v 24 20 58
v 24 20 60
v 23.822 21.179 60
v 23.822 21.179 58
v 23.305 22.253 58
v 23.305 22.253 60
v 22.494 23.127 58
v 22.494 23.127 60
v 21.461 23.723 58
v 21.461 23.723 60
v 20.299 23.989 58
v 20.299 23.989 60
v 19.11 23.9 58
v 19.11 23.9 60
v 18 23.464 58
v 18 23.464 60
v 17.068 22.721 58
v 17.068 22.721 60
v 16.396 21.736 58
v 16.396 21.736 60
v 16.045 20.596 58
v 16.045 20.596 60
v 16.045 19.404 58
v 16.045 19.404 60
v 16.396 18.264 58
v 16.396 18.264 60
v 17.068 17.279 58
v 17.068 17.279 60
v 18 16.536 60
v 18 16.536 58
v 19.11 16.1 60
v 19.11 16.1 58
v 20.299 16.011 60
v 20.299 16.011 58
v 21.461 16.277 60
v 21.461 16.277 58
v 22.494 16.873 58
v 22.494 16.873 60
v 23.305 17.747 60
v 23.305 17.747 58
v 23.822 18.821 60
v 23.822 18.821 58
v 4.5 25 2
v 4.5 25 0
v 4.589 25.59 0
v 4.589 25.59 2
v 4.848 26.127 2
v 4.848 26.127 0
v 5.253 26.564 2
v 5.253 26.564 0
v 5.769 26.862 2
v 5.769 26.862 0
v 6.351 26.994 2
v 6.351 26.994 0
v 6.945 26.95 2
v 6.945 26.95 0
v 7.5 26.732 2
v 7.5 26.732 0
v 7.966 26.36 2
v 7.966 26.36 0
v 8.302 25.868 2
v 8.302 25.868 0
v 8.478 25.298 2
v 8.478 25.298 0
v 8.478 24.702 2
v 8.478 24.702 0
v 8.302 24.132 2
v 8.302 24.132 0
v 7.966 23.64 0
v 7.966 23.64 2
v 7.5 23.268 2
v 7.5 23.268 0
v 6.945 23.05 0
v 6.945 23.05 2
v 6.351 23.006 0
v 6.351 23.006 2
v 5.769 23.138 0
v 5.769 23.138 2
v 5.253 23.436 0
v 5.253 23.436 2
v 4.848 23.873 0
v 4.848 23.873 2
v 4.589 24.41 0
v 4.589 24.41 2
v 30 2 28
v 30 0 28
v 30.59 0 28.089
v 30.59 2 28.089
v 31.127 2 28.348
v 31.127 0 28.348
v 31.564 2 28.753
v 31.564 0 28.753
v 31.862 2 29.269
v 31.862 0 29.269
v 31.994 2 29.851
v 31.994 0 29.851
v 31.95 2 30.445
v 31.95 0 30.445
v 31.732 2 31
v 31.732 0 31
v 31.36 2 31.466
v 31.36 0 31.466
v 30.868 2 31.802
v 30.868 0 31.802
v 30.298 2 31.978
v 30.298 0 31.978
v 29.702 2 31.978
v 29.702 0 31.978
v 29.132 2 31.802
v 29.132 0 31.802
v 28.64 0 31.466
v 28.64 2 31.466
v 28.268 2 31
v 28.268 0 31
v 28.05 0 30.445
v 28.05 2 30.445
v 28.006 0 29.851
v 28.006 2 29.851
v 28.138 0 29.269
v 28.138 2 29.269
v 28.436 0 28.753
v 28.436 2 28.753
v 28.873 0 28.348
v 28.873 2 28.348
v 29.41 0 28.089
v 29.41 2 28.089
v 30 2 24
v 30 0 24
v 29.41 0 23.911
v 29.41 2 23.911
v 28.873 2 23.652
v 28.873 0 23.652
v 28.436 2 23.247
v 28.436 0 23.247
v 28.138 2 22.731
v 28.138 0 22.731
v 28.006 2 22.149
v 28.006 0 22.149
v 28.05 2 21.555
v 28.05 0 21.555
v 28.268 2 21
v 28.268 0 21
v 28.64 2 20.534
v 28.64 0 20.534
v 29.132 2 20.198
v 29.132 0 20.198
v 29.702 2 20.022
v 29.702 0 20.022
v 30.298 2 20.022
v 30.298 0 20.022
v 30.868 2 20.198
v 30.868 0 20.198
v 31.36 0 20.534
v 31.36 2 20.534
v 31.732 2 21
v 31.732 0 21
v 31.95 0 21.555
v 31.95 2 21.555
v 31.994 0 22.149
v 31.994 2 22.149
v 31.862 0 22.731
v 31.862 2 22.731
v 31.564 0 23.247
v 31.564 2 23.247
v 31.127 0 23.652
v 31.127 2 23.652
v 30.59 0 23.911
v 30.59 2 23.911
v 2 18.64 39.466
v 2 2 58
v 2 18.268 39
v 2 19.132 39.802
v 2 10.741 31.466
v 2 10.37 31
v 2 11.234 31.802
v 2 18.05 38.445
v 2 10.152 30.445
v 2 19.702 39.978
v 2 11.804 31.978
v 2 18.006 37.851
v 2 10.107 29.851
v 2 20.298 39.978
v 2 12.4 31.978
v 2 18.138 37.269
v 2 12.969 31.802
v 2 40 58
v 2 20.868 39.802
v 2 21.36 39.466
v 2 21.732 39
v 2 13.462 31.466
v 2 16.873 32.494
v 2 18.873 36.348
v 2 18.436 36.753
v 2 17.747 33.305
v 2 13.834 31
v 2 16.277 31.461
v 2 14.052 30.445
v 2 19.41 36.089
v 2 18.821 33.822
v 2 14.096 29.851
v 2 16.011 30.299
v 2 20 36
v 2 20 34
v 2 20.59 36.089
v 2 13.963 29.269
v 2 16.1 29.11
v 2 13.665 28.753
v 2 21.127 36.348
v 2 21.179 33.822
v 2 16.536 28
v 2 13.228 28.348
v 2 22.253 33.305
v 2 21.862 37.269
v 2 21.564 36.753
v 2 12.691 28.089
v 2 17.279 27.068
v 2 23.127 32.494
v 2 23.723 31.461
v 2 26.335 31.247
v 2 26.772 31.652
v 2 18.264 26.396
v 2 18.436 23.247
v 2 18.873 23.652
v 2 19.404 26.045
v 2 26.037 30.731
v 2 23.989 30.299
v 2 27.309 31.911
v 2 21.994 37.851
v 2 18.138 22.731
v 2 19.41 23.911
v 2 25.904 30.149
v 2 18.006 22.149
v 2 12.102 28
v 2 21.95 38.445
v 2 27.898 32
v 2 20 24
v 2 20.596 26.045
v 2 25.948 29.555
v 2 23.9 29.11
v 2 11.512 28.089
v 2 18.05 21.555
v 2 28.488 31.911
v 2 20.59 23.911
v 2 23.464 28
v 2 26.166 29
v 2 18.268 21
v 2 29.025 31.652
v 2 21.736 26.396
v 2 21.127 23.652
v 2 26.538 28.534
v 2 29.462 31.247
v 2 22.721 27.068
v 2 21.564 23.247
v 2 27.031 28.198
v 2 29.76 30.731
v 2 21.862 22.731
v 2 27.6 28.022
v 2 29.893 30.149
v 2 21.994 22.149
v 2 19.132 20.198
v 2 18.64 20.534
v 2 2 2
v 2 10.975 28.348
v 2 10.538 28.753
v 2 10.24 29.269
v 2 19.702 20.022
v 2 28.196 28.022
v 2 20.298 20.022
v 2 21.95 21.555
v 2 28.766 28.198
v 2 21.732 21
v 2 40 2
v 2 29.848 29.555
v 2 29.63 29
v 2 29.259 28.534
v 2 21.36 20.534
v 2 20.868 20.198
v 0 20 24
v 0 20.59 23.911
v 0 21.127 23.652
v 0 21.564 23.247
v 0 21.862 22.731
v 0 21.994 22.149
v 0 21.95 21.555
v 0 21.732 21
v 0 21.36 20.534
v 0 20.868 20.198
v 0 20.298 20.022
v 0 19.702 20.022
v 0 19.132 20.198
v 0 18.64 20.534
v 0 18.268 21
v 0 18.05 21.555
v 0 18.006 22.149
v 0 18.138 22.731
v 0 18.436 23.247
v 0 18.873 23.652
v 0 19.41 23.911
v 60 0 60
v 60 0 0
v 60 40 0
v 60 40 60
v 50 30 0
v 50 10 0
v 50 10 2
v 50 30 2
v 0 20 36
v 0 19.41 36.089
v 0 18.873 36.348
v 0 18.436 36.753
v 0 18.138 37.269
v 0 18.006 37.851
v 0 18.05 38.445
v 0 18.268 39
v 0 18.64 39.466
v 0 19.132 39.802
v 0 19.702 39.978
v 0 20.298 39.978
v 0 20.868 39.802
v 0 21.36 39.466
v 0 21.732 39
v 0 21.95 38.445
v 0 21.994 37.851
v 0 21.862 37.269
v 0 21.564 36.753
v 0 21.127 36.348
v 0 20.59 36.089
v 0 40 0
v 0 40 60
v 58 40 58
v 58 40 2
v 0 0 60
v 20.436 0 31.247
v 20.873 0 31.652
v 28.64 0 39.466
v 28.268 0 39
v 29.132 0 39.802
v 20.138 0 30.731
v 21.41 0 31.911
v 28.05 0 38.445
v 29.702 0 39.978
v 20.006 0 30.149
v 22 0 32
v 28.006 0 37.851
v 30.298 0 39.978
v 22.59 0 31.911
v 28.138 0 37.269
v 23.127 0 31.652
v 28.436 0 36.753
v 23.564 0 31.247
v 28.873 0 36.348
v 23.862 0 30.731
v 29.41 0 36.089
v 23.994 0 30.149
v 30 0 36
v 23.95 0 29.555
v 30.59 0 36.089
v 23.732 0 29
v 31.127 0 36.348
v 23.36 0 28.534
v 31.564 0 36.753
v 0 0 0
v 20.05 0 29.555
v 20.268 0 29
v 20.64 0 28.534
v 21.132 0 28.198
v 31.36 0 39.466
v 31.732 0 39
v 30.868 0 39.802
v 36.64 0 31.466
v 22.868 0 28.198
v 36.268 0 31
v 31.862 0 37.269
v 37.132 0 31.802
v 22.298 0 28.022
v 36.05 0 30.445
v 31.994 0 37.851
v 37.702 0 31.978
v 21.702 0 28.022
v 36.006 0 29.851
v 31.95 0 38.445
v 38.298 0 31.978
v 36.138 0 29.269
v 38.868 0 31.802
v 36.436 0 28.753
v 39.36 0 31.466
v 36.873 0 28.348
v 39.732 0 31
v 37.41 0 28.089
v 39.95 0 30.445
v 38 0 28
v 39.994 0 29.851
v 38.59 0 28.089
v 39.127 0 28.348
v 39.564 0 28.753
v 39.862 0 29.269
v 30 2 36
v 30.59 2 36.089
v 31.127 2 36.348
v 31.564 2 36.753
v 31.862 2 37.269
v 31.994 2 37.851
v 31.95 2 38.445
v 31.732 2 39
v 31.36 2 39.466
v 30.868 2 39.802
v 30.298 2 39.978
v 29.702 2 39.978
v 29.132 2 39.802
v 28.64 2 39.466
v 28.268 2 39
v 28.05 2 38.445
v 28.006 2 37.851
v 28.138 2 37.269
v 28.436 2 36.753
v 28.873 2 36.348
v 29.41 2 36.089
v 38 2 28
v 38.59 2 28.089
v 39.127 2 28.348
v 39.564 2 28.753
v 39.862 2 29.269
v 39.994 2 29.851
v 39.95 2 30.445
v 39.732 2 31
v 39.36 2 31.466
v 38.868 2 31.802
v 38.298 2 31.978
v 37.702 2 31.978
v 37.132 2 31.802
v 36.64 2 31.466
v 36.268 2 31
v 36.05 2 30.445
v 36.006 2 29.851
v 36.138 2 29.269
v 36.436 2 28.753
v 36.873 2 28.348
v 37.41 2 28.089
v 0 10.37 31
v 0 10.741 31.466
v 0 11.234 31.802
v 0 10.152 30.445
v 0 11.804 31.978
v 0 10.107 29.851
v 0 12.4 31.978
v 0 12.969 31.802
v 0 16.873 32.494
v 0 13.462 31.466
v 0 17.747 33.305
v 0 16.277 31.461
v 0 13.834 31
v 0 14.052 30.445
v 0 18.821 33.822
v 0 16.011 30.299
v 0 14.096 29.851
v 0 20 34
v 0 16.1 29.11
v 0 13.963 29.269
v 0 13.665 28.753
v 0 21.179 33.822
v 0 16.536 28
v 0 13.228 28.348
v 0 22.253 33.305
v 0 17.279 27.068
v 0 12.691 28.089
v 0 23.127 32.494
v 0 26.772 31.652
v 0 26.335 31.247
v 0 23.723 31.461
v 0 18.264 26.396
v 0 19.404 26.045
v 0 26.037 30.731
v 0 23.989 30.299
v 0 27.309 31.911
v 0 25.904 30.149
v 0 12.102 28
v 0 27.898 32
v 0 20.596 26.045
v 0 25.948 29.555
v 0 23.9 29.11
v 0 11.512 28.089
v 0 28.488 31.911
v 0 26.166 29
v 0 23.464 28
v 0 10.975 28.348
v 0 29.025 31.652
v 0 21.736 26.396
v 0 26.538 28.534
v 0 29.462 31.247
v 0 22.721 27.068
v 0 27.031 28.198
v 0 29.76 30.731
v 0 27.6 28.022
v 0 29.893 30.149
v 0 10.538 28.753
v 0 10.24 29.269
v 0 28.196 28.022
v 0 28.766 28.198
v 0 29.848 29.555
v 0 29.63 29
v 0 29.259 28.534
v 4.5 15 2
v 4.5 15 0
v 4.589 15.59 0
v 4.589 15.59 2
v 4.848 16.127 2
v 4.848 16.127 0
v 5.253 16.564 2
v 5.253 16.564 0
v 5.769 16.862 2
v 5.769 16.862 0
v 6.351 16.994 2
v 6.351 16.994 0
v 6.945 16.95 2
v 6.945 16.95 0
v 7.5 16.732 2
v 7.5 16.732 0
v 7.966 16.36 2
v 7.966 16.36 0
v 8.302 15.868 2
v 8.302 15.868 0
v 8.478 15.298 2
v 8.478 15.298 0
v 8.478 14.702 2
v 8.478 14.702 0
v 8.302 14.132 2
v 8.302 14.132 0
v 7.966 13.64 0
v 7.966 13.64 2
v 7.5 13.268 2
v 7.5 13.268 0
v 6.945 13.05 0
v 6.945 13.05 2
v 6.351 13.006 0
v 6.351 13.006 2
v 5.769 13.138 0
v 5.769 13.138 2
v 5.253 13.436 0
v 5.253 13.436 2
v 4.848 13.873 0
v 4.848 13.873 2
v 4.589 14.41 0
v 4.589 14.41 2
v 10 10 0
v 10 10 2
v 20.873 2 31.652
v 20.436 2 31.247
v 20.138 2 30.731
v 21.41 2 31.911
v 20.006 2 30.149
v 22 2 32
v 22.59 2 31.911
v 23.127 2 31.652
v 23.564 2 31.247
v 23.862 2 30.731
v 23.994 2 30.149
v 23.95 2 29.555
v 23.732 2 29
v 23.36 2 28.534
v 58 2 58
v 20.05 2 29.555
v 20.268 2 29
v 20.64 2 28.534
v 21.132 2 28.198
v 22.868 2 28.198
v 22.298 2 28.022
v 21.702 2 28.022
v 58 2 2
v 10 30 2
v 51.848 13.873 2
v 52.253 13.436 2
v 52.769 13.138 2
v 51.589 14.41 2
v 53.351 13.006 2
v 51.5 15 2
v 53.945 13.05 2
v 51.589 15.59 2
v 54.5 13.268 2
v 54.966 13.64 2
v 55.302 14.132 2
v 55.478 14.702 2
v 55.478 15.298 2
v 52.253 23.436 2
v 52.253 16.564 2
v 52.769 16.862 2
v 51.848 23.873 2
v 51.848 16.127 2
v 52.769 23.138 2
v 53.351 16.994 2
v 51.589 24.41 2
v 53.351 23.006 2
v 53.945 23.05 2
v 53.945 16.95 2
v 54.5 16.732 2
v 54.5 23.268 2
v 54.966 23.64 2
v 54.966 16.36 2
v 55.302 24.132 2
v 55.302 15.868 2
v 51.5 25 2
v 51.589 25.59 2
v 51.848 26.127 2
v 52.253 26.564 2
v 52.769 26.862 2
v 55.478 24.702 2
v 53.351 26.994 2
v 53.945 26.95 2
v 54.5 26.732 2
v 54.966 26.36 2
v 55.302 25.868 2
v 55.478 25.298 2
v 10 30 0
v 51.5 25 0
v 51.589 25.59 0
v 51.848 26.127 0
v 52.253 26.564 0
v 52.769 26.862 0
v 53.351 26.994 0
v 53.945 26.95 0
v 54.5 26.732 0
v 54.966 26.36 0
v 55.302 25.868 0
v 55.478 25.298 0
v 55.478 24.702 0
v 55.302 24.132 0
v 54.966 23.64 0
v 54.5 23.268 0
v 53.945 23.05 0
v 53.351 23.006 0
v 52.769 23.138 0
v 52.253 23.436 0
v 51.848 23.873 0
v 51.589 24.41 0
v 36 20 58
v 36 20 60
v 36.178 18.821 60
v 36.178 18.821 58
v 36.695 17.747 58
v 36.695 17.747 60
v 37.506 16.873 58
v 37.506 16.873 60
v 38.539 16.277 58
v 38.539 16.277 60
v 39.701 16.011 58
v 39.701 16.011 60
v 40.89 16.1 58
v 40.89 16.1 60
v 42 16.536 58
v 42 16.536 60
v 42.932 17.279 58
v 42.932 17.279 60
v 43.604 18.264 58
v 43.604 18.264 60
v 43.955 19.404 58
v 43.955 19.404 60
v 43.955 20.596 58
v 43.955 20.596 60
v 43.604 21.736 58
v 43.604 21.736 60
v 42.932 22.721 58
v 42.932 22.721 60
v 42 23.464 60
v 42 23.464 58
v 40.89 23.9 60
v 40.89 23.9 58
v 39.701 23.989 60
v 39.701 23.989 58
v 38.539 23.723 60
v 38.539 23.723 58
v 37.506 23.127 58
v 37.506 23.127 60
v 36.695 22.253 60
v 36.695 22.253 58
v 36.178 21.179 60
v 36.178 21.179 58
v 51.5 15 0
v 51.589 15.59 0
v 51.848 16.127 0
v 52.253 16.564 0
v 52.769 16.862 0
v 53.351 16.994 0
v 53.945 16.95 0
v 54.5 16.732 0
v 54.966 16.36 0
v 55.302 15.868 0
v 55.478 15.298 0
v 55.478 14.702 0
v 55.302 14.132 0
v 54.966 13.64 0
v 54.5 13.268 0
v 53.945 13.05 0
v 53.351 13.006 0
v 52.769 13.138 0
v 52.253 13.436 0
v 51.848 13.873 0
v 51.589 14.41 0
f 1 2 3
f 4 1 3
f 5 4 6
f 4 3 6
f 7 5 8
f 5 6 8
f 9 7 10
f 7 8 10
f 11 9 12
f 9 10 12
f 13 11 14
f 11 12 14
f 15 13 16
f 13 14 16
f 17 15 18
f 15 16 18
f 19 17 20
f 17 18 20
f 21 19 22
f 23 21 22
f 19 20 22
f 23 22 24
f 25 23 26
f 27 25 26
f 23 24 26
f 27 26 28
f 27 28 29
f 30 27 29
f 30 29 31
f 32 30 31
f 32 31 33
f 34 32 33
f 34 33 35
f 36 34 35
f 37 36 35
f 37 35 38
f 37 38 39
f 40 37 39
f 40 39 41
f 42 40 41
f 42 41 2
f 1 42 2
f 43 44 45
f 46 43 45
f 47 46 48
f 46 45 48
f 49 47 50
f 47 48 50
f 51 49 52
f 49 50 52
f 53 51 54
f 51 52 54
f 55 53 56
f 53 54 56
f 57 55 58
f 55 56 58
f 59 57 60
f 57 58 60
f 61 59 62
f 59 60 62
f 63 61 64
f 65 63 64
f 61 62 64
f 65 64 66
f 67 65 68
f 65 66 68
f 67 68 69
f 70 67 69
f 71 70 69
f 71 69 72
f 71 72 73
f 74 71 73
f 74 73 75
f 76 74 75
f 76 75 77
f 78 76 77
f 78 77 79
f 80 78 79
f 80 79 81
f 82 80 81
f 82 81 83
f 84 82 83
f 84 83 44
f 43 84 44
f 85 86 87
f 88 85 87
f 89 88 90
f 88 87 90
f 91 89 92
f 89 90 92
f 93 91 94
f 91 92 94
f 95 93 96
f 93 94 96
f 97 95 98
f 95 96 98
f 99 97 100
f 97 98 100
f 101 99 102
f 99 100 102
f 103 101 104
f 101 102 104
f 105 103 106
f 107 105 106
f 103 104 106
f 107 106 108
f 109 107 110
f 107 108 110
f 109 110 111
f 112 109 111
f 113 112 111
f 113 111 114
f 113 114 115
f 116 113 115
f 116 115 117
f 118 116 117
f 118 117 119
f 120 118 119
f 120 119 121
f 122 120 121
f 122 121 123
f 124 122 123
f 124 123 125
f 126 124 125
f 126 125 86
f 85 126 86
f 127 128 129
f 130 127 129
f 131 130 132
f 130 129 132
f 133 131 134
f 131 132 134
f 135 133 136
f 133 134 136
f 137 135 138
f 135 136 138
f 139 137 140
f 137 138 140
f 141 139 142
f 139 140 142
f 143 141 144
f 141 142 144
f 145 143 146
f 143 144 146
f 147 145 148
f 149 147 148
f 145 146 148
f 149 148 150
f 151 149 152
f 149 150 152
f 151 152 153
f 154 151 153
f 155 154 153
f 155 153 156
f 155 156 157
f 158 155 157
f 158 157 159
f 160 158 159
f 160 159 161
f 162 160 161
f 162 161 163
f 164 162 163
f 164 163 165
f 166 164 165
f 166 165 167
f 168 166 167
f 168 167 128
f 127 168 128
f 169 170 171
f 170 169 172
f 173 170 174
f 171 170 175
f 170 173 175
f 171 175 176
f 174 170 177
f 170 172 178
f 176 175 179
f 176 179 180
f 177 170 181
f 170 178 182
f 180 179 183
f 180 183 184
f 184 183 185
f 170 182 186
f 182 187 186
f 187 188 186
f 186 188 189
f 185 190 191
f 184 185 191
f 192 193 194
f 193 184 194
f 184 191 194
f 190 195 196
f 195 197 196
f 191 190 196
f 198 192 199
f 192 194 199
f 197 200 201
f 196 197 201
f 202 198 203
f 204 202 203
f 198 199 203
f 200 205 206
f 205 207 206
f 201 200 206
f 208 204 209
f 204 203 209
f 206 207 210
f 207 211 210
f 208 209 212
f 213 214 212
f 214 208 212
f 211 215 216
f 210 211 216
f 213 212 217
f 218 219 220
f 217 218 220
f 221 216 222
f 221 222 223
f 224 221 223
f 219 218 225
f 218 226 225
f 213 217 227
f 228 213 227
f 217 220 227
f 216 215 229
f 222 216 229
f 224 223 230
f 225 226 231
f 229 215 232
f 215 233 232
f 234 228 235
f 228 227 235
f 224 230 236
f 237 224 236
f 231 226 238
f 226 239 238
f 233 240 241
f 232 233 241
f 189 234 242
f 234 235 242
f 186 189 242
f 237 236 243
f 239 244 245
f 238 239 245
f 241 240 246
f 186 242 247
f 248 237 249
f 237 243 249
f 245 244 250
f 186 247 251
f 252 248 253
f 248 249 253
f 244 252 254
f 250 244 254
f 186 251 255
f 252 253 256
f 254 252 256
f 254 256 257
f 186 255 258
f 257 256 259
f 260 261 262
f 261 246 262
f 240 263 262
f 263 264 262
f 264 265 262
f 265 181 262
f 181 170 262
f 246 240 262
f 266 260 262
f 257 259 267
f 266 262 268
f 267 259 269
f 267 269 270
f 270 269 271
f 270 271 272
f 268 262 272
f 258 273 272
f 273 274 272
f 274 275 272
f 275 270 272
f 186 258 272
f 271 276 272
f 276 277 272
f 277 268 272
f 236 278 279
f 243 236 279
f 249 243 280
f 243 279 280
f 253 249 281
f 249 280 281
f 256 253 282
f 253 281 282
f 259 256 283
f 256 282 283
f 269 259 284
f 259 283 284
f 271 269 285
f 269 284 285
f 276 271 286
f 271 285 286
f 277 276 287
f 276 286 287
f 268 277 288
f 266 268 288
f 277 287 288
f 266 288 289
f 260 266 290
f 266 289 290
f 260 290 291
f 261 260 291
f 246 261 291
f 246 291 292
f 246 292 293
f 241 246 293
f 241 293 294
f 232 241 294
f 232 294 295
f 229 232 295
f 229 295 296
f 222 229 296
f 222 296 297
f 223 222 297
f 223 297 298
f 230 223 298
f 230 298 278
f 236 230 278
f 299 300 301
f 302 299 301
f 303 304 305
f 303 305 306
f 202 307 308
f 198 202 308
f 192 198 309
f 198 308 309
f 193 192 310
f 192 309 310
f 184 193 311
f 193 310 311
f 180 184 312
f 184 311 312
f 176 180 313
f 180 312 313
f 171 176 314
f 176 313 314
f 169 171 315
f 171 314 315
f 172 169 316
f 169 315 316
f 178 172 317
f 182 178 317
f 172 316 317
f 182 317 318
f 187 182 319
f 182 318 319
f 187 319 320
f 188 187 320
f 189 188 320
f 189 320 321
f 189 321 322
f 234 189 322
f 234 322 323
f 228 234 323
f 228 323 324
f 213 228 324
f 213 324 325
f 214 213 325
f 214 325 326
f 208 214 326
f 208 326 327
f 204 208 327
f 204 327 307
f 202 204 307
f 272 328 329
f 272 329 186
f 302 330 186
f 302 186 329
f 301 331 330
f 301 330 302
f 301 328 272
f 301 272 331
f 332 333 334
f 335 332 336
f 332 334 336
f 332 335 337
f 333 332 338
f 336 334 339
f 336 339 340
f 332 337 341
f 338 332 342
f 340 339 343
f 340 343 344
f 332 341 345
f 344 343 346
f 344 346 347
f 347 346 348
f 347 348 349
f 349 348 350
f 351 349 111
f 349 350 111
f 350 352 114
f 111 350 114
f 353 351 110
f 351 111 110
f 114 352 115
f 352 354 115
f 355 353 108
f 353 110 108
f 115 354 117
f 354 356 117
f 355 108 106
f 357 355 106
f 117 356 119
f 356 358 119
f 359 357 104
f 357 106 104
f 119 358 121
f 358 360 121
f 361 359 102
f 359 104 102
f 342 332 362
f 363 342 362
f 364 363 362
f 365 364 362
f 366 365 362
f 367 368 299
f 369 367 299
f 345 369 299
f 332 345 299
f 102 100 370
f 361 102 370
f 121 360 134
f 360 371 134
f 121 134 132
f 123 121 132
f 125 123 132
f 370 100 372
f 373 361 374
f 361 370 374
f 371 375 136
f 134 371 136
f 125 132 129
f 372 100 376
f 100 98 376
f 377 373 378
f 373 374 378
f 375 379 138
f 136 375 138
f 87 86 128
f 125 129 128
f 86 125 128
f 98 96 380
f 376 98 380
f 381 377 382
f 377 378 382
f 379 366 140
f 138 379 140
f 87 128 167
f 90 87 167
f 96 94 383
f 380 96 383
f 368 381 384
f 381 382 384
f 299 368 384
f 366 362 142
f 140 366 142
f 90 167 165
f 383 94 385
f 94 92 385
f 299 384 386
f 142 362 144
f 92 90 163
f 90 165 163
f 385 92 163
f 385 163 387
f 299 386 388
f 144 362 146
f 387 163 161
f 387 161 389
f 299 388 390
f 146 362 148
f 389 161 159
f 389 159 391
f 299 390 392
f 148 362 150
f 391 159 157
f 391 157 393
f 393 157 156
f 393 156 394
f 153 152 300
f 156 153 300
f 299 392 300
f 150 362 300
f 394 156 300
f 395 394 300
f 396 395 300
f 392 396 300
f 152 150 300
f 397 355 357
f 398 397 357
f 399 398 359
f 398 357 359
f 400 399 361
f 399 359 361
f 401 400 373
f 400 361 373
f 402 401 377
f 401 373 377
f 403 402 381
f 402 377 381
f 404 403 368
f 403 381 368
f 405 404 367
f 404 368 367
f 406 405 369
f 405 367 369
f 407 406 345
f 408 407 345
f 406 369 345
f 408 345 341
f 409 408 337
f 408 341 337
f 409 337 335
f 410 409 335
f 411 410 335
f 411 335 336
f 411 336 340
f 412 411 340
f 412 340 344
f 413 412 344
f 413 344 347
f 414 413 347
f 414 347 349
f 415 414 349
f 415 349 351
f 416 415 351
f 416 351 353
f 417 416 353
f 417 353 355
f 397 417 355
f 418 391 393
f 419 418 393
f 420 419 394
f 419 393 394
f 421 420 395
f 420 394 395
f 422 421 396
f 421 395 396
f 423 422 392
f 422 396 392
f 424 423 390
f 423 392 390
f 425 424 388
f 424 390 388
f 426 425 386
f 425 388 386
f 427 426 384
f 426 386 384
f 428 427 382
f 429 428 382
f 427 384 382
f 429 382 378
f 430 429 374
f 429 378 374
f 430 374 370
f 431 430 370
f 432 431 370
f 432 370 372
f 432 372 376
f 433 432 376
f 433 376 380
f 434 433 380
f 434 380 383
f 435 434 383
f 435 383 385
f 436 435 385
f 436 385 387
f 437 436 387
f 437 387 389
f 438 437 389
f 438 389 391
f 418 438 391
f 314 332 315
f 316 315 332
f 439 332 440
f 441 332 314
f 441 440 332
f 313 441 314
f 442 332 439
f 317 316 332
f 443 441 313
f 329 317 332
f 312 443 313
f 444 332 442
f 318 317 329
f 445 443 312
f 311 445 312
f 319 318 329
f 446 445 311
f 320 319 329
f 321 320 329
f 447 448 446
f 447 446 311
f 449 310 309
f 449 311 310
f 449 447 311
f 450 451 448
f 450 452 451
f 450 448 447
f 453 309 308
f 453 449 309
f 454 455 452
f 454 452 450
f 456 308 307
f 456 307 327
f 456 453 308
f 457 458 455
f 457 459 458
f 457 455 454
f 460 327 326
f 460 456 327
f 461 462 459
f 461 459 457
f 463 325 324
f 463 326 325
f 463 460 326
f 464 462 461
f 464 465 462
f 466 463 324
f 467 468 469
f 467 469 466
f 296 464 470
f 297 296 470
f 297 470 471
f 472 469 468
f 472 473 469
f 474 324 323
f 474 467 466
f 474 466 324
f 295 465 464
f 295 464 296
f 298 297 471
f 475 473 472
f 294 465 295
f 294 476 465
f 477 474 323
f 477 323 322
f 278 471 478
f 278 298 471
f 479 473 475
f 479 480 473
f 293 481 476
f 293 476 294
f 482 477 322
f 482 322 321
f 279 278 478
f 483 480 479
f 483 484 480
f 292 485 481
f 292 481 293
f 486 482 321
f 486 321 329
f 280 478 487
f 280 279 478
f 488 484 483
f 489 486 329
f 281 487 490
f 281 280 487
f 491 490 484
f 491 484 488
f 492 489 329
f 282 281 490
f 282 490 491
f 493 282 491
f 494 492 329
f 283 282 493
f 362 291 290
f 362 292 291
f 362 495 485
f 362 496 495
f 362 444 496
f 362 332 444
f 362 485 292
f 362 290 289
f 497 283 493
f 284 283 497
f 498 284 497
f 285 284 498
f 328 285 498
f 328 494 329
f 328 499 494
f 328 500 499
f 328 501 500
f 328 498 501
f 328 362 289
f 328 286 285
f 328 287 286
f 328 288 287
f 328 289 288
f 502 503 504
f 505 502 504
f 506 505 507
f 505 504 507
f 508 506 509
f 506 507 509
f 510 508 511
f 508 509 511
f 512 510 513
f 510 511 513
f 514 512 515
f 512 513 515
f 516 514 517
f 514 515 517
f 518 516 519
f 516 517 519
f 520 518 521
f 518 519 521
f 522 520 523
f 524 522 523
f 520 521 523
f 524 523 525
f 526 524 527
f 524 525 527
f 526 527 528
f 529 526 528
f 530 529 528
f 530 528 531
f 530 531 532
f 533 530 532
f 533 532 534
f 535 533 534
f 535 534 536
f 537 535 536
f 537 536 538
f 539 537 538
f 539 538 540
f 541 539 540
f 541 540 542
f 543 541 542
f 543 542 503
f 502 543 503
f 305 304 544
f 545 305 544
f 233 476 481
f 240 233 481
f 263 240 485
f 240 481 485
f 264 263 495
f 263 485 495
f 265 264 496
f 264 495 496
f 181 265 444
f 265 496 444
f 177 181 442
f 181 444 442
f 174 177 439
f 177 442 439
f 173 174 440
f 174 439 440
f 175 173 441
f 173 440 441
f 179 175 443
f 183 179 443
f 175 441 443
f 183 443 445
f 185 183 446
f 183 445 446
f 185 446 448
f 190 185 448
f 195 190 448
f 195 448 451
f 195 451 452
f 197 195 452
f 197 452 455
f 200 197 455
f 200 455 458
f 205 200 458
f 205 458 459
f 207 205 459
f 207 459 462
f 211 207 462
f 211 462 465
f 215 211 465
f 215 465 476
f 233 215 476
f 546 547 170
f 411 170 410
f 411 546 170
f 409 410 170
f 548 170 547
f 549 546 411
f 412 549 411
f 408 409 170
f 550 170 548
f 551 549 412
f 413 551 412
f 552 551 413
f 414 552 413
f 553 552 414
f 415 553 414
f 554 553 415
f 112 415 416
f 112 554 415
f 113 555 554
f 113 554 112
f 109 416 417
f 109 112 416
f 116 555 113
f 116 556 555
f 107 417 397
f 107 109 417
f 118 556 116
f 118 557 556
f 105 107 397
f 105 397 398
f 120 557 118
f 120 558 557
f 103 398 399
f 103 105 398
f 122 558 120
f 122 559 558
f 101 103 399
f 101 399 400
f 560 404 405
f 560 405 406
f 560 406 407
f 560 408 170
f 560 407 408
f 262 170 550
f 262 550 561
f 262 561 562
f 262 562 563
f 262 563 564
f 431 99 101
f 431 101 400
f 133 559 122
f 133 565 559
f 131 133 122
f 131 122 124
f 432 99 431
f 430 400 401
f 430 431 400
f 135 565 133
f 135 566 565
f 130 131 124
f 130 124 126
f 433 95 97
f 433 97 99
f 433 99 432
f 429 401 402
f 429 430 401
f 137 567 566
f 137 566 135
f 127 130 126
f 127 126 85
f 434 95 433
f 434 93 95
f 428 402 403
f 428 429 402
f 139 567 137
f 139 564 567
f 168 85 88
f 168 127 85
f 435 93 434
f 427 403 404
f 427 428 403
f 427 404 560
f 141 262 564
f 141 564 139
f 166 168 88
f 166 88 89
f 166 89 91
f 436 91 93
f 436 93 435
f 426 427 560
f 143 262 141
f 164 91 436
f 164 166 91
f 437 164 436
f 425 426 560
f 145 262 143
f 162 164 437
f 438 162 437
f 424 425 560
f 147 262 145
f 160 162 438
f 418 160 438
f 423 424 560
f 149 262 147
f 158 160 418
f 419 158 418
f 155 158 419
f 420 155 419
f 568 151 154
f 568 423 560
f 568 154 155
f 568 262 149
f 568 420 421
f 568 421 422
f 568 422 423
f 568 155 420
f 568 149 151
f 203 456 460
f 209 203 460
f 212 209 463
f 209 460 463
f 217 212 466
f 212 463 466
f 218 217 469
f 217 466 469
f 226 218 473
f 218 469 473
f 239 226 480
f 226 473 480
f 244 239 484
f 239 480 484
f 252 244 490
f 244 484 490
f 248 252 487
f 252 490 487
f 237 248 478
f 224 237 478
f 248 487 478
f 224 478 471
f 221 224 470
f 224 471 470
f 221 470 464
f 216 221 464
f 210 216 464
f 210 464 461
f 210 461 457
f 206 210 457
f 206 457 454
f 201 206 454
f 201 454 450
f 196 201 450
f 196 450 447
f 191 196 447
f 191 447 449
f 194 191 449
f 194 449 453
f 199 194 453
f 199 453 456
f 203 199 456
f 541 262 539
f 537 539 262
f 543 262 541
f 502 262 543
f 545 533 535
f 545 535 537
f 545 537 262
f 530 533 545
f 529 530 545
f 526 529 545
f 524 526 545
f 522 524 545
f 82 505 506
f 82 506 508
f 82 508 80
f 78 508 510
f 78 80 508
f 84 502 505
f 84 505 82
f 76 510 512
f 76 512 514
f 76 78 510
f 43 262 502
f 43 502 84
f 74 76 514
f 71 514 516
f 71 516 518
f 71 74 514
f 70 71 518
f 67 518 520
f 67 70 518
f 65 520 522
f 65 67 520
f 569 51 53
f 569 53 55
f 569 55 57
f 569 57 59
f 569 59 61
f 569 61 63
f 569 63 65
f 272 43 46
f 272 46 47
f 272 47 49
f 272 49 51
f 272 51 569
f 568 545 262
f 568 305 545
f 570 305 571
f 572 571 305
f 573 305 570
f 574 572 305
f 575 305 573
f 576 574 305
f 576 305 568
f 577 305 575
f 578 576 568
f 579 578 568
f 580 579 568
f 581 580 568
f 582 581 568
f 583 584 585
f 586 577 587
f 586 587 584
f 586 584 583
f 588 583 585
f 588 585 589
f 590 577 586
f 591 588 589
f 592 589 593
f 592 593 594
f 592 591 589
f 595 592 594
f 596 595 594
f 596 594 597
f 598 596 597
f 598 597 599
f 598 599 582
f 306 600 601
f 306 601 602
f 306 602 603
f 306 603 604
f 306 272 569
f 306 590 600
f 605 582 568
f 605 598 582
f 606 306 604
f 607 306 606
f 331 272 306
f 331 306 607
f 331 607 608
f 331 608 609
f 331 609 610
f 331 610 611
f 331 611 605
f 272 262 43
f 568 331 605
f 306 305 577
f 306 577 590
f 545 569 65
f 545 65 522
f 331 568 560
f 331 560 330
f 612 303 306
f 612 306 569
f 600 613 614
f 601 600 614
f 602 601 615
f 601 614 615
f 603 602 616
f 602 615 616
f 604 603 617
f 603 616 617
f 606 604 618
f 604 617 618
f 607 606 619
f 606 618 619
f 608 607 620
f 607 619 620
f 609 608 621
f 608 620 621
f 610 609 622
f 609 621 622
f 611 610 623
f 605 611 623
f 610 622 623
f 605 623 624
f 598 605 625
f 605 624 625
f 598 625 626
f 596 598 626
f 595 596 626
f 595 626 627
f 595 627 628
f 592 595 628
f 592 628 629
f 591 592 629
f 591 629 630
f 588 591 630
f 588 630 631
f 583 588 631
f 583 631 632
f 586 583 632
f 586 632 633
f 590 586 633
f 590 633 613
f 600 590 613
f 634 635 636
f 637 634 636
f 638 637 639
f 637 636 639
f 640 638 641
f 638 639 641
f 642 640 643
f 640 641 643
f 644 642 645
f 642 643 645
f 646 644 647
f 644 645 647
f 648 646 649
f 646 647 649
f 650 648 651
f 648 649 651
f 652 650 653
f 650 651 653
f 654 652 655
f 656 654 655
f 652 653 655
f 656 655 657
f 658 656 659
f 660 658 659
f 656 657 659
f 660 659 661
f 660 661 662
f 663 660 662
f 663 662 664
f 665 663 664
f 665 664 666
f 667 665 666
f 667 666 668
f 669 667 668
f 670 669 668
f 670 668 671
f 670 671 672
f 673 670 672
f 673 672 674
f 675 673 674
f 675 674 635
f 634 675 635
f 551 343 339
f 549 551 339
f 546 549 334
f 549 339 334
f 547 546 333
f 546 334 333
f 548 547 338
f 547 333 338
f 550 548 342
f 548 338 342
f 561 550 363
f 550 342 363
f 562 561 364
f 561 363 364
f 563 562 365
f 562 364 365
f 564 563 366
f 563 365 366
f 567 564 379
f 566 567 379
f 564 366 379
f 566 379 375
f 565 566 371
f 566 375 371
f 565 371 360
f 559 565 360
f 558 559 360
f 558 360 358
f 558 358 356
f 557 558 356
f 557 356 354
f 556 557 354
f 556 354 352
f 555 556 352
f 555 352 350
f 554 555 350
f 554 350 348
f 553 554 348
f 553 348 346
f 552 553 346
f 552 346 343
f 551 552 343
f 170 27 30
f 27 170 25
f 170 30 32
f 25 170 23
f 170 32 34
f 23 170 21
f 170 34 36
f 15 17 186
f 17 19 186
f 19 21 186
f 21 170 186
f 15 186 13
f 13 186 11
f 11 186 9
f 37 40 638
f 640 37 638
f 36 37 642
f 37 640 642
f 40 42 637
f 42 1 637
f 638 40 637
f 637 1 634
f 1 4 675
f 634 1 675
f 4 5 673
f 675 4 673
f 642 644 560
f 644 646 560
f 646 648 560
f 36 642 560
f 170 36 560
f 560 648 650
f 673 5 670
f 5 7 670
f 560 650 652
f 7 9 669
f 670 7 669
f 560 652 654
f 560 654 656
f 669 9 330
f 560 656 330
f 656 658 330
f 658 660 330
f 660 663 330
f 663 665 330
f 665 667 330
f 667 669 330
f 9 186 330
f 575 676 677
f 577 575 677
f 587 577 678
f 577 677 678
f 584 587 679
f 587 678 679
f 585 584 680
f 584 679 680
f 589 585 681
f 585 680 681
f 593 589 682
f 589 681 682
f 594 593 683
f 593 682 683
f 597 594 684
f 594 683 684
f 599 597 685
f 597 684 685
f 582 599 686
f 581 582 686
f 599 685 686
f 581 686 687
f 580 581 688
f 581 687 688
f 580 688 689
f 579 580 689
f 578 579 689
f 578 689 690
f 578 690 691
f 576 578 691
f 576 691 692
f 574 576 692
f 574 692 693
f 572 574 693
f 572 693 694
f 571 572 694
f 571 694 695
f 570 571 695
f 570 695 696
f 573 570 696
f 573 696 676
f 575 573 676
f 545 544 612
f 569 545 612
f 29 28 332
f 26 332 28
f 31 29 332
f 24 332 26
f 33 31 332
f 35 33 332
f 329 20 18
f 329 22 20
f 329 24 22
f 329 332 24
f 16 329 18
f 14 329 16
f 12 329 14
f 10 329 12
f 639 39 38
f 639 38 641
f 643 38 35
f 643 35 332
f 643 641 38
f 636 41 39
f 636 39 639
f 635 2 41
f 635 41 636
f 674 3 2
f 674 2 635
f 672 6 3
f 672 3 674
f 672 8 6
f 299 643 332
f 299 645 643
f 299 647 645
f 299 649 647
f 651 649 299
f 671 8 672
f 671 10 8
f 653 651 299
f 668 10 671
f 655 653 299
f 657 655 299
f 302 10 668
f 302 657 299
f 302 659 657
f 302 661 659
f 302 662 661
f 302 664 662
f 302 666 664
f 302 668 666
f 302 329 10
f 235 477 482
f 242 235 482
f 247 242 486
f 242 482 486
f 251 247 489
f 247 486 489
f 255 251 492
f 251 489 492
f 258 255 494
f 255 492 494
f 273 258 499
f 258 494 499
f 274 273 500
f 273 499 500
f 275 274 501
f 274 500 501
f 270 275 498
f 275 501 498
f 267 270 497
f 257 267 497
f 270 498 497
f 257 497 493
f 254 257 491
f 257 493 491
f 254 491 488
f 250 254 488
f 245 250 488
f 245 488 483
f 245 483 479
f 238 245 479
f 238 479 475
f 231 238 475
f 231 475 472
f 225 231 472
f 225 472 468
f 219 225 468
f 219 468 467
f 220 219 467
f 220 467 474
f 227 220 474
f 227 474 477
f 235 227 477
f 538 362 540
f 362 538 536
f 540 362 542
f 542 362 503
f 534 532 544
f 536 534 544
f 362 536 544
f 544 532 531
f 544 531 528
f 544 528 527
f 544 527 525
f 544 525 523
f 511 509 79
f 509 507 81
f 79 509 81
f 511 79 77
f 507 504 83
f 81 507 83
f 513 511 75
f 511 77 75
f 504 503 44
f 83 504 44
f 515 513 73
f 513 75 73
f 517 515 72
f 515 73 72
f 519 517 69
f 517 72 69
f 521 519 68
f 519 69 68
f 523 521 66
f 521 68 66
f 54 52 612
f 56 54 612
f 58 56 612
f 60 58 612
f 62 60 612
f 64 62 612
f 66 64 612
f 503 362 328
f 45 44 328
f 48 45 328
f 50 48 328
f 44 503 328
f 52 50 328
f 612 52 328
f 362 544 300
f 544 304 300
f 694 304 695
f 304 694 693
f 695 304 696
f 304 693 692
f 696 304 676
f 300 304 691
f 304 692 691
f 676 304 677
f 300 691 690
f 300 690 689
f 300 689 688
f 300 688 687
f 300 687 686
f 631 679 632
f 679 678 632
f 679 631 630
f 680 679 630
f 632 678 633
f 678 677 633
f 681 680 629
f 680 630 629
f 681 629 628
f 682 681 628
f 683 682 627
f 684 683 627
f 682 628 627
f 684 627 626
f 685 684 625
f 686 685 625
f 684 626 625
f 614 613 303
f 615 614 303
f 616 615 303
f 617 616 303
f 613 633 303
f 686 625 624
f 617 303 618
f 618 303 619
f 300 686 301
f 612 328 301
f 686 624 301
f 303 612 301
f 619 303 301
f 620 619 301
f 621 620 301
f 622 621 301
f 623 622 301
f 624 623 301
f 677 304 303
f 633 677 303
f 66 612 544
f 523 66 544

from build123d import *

# Parameters (mm, degrees)
IZIM2_W                     = 60
IZIM2_H                     = 40
Y_KSEKLIK_EKSTR_ZYON1_DEPTH = 60
BO_ALTMA1_T                 = -2
KES_EKSTR_ZYON2_REACH       = 95.808
IZIM4_R                     = 2
IZIM4_W                     = 40
IZIM4_H                     = 20
KES_EKSTR_ZYON3_REACH       = 95.808
IZIM5_R                     = 2
KES_EKSTR_ZYON4_REACH       = 95.808
IZIM6_R                     = 4
KES_EKSTR_ZYON5_REACH       = 95.808
IZIM7_R                     = 4
IZIM7_R_2                   = 2


with BuildPart() as part:
    # Çizim2 → Yükseklik-Ekstrüzyon1 (new body)
    with BuildSketch(Plane.XY):
        with Locations((30, 20)):
            Rectangle(IZIM2_W, IZIM2_H)
    extrude(amount=Y_KSEKLIK_EKSTR_ZYON1_DEPTH)

    # İç Boşaltma1
    bo_altma1_openings = [part.faces().sort_by_distance(p)[0] for p in [
        (30, 40, 30),
    ]]
    offset(amount=BO_ALTMA1_T, openings=bo_altma1_openings, kind=Kind.INTERSECTION)

    # Çizim4 → Kes-Ekstrüzyon2 (cut, up to next)
    with BuildSketch(Plane(origin=(0, 0, 0), x_dir=(-1, 0, 0), z_dir=(0, 0, -1)), mode=Mode.PRIVATE) as kes_ekstr_zyon2_sk1:
        with Locations((-53.5, 25)):
            Circle(IZIM4_R)
    kes_ekstr_zyon2_tool1 = extrude(kes_ekstr_zyon2_sk1.sketch, amount=-KES_EKSTR_ZYON2_REACH, mode=Mode.PRIVATE) & part.part
    # Çizim4 → Kes-Ekstrüzyon2 (cut, up to next)
    with BuildSketch(Plane(origin=(0, 0, 0), x_dir=(-1, 0, 0), z_dir=(0, 0, -1)), mode=Mode.PRIVATE) as kes_ekstr_zyon2_sk2:
        with Locations((-53.5, 15)):
            Circle(IZIM4_R)
    kes_ekstr_zyon2_tool2 = extrude(kes_ekstr_zyon2_sk2.sketch, amount=-KES_EKSTR_ZYON2_REACH, mode=Mode.PRIVATE) & part.part
    # Çizim4 → Kes-Ekstrüzyon2 (cut, up to next)
    with BuildSketch(Plane(origin=(0, 0, 0), x_dir=(-1, 0, 0), z_dir=(0, 0, -1)), mode=Mode.PRIVATE) as kes_ekstr_zyon2_sk3:
        with Locations((-6.5, 15)):
            Circle(IZIM4_R)
    kes_ekstr_zyon2_tool3 = extrude(kes_ekstr_zyon2_sk3.sketch, amount=-KES_EKSTR_ZYON2_REACH, mode=Mode.PRIVATE) & part.part
    # Çizim4 → Kes-Ekstrüzyon2 (cut, up to next)
    with BuildSketch(Plane(origin=(0, 0, 0), x_dir=(-1, 0, 0), z_dir=(0, 0, -1)), mode=Mode.PRIVATE) as kes_ekstr_zyon2_sk4:
        with Locations((-6.5, 25)):
            Circle(IZIM4_R)
    kes_ekstr_zyon2_tool4 = extrude(kes_ekstr_zyon2_sk4.sketch, amount=-KES_EKSTR_ZYON2_REACH, mode=Mode.PRIVATE) & part.part
    # Çizim4 → Kes-Ekstrüzyon2 (cut, up to next)
    with BuildSketch(Plane(origin=(0, 0, 0), x_dir=(-1, 0, 0), z_dir=(0, 0, -1)), mode=Mode.PRIVATE) as kes_ekstr_zyon2_sk5:
        with Locations((-30, 20)):
            Rectangle(IZIM4_W, IZIM4_H)
    kes_ekstr_zyon2_tool5 = extrude(kes_ekstr_zyon2_sk5.sketch, amount=-KES_EKSTR_ZYON2_REACH, mode=Mode.PRIVATE) & part.part
    add(kes_ekstr_zyon2_tool1.solids().sort_by_distance((53.5, 25, 0))[0], mode=Mode.SUBTRACT)
    add(kes_ekstr_zyon2_tool2.solids().sort_by_distance((53.5, 15, 0))[0], mode=Mode.SUBTRACT)
    add(kes_ekstr_zyon2_tool3.solids().sort_by_distance((6.5, 15, 0))[0], mode=Mode.SUBTRACT)
    add(kes_ekstr_zyon2_tool4.solids().sort_by_distance((6.5, 25, 0))[0], mode=Mode.SUBTRACT)
    add(kes_ekstr_zyon2_tool5.solids().sort_by_distance((30, 20, 0))[0], mode=Mode.SUBTRACT)

    # Çizim5 → Kes-Ekstrüzyon3 (cut, up to next)
    with BuildSketch(Plane.XZ, mode=Mode.PRIVATE) as kes_ekstr_zyon3_sk1:
        with Locations(Location((30, 30, 0), (0, 0, 270))):
            Circle(IZIM5_R)
    kes_ekstr_zyon3_tool1 = extrude(kes_ekstr_zyon3_sk1.sketch, amount=-KES_EKSTR_ZYON3_REACH, mode=Mode.PRIVATE) & part.part
    # Çizim5 → Kes-Ekstrüzyon3 (cut, up to next)
    with BuildSketch(Plane.XZ, mode=Mode.PRIVATE) as kes_ekstr_zyon3_sk2:
        with Locations(Location((38, 30, 0), (0, 0, 270))):
            Circle(IZIM5_R)
    kes_ekstr_zyon3_tool2 = extrude(kes_ekstr_zyon3_sk2.sketch, amount=-KES_EKSTR_ZYON3_REACH, mode=Mode.PRIVATE) & part.part
    # Çizim5 → Kes-Ekstrüzyon3 (cut, up to next)
    with BuildSketch(Plane.XZ, mode=Mode.PRIVATE) as kes_ekstr_zyon3_sk3:
        with Locations(Location((30, 38, 0), (0, 0, 270))):
            Circle(IZIM5_R)
    kes_ekstr_zyon3_tool3 = extrude(kes_ekstr_zyon3_sk3.sketch, amount=-KES_EKSTR_ZYON3_REACH, mode=Mode.PRIVATE) & part.part
    # Çizim5 → Kes-Ekstrüzyon3 (cut, up to next)
    with BuildSketch(Plane.XZ, mode=Mode.PRIVATE) as kes_ekstr_zyon3_sk4:
        with Locations(Location((30, 22, 0), (0, 0, 90))):
            Circle(IZIM5_R)
    kes_ekstr_zyon3_tool4 = extrude(kes_ekstr_zyon3_sk4.sketch, amount=-KES_EKSTR_ZYON3_REACH, mode=Mode.PRIVATE) & part.part
    # Çizim5 → Kes-Ekstrüzyon3 (cut, up to next)
    with BuildSketch(Plane.XZ, mode=Mode.PRIVATE) as kes_ekstr_zyon3_sk5:
        with Locations(Location((22, 30, 0), (0, 0, 90))):
            Circle(IZIM5_R)
    kes_ekstr_zyon3_tool5 = extrude(kes_ekstr_zyon3_sk5.sketch, amount=-KES_EKSTR_ZYON3_REACH, mode=Mode.PRIVATE) & part.part
    add(kes_ekstr_zyon3_tool1.solids().sort_by_distance((30, 0, 30))[0], mode=Mode.SUBTRACT)
    add(kes_ekstr_zyon3_tool2.solids().sort_by_distance((38, 0, 30))[0], mode=Mode.SUBTRACT)
    add(kes_ekstr_zyon3_tool3.solids().sort_by_distance((30, 0, 38))[0], mode=Mode.SUBTRACT)
    add(kes_ekstr_zyon3_tool4.solids().sort_by_distance((30, 0, 22))[0], mode=Mode.SUBTRACT)
    add(kes_ekstr_zyon3_tool5.solids().sort_by_distance((22, 0, 30))[0], mode=Mode.SUBTRACT)

    # Çizim6 → Kes-Ekstrüzyon4 (cut, up to next)
    with BuildSketch(Plane.XY.offset(60), mode=Mode.PRIVATE) as kes_ekstr_zyon4_sk1:
        with Locations((20, 20)):
            Circle(IZIM6_R)
    kes_ekstr_zyon4_tool1 = extrude(kes_ekstr_zyon4_sk1.sketch, amount=-KES_EKSTR_ZYON4_REACH, mode=Mode.PRIVATE) & part.part
    # Çizim6 → Kes-Ekstrüzyon4 (cut, up to next)
    with BuildSketch(Plane.XY.offset(60), mode=Mode.PRIVATE) as kes_ekstr_zyon4_sk2:
        with Locations(Location((40, 20, 0), (0, 0, 180))):
            Circle(IZIM6_R)
    kes_ekstr_zyon4_tool2 = extrude(kes_ekstr_zyon4_sk2.sketch, amount=-KES_EKSTR_ZYON4_REACH, mode=Mode.PRIVATE) & part.part
    add(kes_ekstr_zyon4_tool1.solids().sort_by_distance((20, 20, 60))[0], mode=Mode.SUBTRACT)
    add(kes_ekstr_zyon4_tool2.solids().sort_by_distance((40, 20, 60))[0], mode=Mode.SUBTRACT)

    # Çizim7 → Kes-Ekstrüzyon5 (cut, up to next)
    with BuildSketch(Plane.ZY, mode=Mode.PRIVATE) as kes_ekstr_zyon5_sk1:
        with Locations((30, 20)):
            Circle(IZIM7_R)
    kes_ekstr_zyon5_tool1 = extrude(kes_ekstr_zyon5_sk1.sketch, amount=-KES_EKSTR_ZYON5_REACH, mode=Mode.PRIVATE) & part.part
    # Çizim7 → Kes-Ekstrüzyon5 (cut, up to next)
    with BuildSketch(Plane.ZY, mode=Mode.PRIVATE) as kes_ekstr_zyon5_sk2:
        with Locations((22, 20)):
            Circle(IZIM7_R_2)
    kes_ekstr_zyon5_tool2 = extrude(kes_ekstr_zyon5_sk2.sketch, amount=-KES_EKSTR_ZYON5_REACH, mode=Mode.PRIVATE) & part.part
    # Çizim7 → Kes-Ekstrüzyon5 (cut, up to next)
    with BuildSketch(Plane.ZY, mode=Mode.PRIVATE) as kes_ekstr_zyon5_sk3:
        with Locations(Location((38, 20, 0), (0, 0, 180))):
            Circle(IZIM7_R_2)
    kes_ekstr_zyon5_tool3 = extrude(kes_ekstr_zyon5_sk3.sketch, amount=-KES_EKSTR_ZYON5_REACH, mode=Mode.PRIVATE) & part.part
    # Çizim7 → Kes-Ekstrüzyon5 (cut, up to next)
    with BuildSketch(Plane.ZY, mode=Mode.PRIVATE) as kes_ekstr_zyon5_sk4:
        with Locations((30, 27.898318077)):
            Circle(IZIM7_R_2)
    kes_ekstr_zyon5_tool4 = extrude(kes_ekstr_zyon5_sk4.sketch, amount=-KES_EKSTR_ZYON5_REACH, mode=Mode.PRIVATE) & part.part
    # Çizim7 → Kes-Ekstrüzyon5 (cut, up to next)
    with BuildSketch(Plane.ZY, mode=Mode.PRIVATE) as kes_ekstr_zyon5_sk5:
        with Locations(Location((30, 12.101681923, 0), (0, 0, 180))):
            Circle(IZIM7_R_2)
    kes_ekstr_zyon5_tool5 = extrude(kes_ekstr_zyon5_sk5.sketch, amount=-KES_EKSTR_ZYON5_REACH, mode=Mode.PRIVATE) & part.part
    add(kes_ekstr_zyon5_tool1.solids().sort_by_distance((0, 20, 30))[0], mode=Mode.SUBTRACT)
    add(kes_ekstr_zyon5_tool2.solids().sort_by_distance((0, 20, 22))[0], mode=Mode.SUBTRACT)
    add(kes_ekstr_zyon5_tool3.solids().sort_by_distance((0, 20, 38))[0], mode=Mode.SUBTRACT)
    add(kes_ekstr_zyon5_tool4.solids().sort_by_distance((0, 27.898318, 30))[0], mode=Mode.SUBTRACT)
    add(kes_ekstr_zyon5_tool5.solids().sort_by_distance((0, 12.101682, 30))[0], mode=Mode.SUBTRACT)


solid = part.part
